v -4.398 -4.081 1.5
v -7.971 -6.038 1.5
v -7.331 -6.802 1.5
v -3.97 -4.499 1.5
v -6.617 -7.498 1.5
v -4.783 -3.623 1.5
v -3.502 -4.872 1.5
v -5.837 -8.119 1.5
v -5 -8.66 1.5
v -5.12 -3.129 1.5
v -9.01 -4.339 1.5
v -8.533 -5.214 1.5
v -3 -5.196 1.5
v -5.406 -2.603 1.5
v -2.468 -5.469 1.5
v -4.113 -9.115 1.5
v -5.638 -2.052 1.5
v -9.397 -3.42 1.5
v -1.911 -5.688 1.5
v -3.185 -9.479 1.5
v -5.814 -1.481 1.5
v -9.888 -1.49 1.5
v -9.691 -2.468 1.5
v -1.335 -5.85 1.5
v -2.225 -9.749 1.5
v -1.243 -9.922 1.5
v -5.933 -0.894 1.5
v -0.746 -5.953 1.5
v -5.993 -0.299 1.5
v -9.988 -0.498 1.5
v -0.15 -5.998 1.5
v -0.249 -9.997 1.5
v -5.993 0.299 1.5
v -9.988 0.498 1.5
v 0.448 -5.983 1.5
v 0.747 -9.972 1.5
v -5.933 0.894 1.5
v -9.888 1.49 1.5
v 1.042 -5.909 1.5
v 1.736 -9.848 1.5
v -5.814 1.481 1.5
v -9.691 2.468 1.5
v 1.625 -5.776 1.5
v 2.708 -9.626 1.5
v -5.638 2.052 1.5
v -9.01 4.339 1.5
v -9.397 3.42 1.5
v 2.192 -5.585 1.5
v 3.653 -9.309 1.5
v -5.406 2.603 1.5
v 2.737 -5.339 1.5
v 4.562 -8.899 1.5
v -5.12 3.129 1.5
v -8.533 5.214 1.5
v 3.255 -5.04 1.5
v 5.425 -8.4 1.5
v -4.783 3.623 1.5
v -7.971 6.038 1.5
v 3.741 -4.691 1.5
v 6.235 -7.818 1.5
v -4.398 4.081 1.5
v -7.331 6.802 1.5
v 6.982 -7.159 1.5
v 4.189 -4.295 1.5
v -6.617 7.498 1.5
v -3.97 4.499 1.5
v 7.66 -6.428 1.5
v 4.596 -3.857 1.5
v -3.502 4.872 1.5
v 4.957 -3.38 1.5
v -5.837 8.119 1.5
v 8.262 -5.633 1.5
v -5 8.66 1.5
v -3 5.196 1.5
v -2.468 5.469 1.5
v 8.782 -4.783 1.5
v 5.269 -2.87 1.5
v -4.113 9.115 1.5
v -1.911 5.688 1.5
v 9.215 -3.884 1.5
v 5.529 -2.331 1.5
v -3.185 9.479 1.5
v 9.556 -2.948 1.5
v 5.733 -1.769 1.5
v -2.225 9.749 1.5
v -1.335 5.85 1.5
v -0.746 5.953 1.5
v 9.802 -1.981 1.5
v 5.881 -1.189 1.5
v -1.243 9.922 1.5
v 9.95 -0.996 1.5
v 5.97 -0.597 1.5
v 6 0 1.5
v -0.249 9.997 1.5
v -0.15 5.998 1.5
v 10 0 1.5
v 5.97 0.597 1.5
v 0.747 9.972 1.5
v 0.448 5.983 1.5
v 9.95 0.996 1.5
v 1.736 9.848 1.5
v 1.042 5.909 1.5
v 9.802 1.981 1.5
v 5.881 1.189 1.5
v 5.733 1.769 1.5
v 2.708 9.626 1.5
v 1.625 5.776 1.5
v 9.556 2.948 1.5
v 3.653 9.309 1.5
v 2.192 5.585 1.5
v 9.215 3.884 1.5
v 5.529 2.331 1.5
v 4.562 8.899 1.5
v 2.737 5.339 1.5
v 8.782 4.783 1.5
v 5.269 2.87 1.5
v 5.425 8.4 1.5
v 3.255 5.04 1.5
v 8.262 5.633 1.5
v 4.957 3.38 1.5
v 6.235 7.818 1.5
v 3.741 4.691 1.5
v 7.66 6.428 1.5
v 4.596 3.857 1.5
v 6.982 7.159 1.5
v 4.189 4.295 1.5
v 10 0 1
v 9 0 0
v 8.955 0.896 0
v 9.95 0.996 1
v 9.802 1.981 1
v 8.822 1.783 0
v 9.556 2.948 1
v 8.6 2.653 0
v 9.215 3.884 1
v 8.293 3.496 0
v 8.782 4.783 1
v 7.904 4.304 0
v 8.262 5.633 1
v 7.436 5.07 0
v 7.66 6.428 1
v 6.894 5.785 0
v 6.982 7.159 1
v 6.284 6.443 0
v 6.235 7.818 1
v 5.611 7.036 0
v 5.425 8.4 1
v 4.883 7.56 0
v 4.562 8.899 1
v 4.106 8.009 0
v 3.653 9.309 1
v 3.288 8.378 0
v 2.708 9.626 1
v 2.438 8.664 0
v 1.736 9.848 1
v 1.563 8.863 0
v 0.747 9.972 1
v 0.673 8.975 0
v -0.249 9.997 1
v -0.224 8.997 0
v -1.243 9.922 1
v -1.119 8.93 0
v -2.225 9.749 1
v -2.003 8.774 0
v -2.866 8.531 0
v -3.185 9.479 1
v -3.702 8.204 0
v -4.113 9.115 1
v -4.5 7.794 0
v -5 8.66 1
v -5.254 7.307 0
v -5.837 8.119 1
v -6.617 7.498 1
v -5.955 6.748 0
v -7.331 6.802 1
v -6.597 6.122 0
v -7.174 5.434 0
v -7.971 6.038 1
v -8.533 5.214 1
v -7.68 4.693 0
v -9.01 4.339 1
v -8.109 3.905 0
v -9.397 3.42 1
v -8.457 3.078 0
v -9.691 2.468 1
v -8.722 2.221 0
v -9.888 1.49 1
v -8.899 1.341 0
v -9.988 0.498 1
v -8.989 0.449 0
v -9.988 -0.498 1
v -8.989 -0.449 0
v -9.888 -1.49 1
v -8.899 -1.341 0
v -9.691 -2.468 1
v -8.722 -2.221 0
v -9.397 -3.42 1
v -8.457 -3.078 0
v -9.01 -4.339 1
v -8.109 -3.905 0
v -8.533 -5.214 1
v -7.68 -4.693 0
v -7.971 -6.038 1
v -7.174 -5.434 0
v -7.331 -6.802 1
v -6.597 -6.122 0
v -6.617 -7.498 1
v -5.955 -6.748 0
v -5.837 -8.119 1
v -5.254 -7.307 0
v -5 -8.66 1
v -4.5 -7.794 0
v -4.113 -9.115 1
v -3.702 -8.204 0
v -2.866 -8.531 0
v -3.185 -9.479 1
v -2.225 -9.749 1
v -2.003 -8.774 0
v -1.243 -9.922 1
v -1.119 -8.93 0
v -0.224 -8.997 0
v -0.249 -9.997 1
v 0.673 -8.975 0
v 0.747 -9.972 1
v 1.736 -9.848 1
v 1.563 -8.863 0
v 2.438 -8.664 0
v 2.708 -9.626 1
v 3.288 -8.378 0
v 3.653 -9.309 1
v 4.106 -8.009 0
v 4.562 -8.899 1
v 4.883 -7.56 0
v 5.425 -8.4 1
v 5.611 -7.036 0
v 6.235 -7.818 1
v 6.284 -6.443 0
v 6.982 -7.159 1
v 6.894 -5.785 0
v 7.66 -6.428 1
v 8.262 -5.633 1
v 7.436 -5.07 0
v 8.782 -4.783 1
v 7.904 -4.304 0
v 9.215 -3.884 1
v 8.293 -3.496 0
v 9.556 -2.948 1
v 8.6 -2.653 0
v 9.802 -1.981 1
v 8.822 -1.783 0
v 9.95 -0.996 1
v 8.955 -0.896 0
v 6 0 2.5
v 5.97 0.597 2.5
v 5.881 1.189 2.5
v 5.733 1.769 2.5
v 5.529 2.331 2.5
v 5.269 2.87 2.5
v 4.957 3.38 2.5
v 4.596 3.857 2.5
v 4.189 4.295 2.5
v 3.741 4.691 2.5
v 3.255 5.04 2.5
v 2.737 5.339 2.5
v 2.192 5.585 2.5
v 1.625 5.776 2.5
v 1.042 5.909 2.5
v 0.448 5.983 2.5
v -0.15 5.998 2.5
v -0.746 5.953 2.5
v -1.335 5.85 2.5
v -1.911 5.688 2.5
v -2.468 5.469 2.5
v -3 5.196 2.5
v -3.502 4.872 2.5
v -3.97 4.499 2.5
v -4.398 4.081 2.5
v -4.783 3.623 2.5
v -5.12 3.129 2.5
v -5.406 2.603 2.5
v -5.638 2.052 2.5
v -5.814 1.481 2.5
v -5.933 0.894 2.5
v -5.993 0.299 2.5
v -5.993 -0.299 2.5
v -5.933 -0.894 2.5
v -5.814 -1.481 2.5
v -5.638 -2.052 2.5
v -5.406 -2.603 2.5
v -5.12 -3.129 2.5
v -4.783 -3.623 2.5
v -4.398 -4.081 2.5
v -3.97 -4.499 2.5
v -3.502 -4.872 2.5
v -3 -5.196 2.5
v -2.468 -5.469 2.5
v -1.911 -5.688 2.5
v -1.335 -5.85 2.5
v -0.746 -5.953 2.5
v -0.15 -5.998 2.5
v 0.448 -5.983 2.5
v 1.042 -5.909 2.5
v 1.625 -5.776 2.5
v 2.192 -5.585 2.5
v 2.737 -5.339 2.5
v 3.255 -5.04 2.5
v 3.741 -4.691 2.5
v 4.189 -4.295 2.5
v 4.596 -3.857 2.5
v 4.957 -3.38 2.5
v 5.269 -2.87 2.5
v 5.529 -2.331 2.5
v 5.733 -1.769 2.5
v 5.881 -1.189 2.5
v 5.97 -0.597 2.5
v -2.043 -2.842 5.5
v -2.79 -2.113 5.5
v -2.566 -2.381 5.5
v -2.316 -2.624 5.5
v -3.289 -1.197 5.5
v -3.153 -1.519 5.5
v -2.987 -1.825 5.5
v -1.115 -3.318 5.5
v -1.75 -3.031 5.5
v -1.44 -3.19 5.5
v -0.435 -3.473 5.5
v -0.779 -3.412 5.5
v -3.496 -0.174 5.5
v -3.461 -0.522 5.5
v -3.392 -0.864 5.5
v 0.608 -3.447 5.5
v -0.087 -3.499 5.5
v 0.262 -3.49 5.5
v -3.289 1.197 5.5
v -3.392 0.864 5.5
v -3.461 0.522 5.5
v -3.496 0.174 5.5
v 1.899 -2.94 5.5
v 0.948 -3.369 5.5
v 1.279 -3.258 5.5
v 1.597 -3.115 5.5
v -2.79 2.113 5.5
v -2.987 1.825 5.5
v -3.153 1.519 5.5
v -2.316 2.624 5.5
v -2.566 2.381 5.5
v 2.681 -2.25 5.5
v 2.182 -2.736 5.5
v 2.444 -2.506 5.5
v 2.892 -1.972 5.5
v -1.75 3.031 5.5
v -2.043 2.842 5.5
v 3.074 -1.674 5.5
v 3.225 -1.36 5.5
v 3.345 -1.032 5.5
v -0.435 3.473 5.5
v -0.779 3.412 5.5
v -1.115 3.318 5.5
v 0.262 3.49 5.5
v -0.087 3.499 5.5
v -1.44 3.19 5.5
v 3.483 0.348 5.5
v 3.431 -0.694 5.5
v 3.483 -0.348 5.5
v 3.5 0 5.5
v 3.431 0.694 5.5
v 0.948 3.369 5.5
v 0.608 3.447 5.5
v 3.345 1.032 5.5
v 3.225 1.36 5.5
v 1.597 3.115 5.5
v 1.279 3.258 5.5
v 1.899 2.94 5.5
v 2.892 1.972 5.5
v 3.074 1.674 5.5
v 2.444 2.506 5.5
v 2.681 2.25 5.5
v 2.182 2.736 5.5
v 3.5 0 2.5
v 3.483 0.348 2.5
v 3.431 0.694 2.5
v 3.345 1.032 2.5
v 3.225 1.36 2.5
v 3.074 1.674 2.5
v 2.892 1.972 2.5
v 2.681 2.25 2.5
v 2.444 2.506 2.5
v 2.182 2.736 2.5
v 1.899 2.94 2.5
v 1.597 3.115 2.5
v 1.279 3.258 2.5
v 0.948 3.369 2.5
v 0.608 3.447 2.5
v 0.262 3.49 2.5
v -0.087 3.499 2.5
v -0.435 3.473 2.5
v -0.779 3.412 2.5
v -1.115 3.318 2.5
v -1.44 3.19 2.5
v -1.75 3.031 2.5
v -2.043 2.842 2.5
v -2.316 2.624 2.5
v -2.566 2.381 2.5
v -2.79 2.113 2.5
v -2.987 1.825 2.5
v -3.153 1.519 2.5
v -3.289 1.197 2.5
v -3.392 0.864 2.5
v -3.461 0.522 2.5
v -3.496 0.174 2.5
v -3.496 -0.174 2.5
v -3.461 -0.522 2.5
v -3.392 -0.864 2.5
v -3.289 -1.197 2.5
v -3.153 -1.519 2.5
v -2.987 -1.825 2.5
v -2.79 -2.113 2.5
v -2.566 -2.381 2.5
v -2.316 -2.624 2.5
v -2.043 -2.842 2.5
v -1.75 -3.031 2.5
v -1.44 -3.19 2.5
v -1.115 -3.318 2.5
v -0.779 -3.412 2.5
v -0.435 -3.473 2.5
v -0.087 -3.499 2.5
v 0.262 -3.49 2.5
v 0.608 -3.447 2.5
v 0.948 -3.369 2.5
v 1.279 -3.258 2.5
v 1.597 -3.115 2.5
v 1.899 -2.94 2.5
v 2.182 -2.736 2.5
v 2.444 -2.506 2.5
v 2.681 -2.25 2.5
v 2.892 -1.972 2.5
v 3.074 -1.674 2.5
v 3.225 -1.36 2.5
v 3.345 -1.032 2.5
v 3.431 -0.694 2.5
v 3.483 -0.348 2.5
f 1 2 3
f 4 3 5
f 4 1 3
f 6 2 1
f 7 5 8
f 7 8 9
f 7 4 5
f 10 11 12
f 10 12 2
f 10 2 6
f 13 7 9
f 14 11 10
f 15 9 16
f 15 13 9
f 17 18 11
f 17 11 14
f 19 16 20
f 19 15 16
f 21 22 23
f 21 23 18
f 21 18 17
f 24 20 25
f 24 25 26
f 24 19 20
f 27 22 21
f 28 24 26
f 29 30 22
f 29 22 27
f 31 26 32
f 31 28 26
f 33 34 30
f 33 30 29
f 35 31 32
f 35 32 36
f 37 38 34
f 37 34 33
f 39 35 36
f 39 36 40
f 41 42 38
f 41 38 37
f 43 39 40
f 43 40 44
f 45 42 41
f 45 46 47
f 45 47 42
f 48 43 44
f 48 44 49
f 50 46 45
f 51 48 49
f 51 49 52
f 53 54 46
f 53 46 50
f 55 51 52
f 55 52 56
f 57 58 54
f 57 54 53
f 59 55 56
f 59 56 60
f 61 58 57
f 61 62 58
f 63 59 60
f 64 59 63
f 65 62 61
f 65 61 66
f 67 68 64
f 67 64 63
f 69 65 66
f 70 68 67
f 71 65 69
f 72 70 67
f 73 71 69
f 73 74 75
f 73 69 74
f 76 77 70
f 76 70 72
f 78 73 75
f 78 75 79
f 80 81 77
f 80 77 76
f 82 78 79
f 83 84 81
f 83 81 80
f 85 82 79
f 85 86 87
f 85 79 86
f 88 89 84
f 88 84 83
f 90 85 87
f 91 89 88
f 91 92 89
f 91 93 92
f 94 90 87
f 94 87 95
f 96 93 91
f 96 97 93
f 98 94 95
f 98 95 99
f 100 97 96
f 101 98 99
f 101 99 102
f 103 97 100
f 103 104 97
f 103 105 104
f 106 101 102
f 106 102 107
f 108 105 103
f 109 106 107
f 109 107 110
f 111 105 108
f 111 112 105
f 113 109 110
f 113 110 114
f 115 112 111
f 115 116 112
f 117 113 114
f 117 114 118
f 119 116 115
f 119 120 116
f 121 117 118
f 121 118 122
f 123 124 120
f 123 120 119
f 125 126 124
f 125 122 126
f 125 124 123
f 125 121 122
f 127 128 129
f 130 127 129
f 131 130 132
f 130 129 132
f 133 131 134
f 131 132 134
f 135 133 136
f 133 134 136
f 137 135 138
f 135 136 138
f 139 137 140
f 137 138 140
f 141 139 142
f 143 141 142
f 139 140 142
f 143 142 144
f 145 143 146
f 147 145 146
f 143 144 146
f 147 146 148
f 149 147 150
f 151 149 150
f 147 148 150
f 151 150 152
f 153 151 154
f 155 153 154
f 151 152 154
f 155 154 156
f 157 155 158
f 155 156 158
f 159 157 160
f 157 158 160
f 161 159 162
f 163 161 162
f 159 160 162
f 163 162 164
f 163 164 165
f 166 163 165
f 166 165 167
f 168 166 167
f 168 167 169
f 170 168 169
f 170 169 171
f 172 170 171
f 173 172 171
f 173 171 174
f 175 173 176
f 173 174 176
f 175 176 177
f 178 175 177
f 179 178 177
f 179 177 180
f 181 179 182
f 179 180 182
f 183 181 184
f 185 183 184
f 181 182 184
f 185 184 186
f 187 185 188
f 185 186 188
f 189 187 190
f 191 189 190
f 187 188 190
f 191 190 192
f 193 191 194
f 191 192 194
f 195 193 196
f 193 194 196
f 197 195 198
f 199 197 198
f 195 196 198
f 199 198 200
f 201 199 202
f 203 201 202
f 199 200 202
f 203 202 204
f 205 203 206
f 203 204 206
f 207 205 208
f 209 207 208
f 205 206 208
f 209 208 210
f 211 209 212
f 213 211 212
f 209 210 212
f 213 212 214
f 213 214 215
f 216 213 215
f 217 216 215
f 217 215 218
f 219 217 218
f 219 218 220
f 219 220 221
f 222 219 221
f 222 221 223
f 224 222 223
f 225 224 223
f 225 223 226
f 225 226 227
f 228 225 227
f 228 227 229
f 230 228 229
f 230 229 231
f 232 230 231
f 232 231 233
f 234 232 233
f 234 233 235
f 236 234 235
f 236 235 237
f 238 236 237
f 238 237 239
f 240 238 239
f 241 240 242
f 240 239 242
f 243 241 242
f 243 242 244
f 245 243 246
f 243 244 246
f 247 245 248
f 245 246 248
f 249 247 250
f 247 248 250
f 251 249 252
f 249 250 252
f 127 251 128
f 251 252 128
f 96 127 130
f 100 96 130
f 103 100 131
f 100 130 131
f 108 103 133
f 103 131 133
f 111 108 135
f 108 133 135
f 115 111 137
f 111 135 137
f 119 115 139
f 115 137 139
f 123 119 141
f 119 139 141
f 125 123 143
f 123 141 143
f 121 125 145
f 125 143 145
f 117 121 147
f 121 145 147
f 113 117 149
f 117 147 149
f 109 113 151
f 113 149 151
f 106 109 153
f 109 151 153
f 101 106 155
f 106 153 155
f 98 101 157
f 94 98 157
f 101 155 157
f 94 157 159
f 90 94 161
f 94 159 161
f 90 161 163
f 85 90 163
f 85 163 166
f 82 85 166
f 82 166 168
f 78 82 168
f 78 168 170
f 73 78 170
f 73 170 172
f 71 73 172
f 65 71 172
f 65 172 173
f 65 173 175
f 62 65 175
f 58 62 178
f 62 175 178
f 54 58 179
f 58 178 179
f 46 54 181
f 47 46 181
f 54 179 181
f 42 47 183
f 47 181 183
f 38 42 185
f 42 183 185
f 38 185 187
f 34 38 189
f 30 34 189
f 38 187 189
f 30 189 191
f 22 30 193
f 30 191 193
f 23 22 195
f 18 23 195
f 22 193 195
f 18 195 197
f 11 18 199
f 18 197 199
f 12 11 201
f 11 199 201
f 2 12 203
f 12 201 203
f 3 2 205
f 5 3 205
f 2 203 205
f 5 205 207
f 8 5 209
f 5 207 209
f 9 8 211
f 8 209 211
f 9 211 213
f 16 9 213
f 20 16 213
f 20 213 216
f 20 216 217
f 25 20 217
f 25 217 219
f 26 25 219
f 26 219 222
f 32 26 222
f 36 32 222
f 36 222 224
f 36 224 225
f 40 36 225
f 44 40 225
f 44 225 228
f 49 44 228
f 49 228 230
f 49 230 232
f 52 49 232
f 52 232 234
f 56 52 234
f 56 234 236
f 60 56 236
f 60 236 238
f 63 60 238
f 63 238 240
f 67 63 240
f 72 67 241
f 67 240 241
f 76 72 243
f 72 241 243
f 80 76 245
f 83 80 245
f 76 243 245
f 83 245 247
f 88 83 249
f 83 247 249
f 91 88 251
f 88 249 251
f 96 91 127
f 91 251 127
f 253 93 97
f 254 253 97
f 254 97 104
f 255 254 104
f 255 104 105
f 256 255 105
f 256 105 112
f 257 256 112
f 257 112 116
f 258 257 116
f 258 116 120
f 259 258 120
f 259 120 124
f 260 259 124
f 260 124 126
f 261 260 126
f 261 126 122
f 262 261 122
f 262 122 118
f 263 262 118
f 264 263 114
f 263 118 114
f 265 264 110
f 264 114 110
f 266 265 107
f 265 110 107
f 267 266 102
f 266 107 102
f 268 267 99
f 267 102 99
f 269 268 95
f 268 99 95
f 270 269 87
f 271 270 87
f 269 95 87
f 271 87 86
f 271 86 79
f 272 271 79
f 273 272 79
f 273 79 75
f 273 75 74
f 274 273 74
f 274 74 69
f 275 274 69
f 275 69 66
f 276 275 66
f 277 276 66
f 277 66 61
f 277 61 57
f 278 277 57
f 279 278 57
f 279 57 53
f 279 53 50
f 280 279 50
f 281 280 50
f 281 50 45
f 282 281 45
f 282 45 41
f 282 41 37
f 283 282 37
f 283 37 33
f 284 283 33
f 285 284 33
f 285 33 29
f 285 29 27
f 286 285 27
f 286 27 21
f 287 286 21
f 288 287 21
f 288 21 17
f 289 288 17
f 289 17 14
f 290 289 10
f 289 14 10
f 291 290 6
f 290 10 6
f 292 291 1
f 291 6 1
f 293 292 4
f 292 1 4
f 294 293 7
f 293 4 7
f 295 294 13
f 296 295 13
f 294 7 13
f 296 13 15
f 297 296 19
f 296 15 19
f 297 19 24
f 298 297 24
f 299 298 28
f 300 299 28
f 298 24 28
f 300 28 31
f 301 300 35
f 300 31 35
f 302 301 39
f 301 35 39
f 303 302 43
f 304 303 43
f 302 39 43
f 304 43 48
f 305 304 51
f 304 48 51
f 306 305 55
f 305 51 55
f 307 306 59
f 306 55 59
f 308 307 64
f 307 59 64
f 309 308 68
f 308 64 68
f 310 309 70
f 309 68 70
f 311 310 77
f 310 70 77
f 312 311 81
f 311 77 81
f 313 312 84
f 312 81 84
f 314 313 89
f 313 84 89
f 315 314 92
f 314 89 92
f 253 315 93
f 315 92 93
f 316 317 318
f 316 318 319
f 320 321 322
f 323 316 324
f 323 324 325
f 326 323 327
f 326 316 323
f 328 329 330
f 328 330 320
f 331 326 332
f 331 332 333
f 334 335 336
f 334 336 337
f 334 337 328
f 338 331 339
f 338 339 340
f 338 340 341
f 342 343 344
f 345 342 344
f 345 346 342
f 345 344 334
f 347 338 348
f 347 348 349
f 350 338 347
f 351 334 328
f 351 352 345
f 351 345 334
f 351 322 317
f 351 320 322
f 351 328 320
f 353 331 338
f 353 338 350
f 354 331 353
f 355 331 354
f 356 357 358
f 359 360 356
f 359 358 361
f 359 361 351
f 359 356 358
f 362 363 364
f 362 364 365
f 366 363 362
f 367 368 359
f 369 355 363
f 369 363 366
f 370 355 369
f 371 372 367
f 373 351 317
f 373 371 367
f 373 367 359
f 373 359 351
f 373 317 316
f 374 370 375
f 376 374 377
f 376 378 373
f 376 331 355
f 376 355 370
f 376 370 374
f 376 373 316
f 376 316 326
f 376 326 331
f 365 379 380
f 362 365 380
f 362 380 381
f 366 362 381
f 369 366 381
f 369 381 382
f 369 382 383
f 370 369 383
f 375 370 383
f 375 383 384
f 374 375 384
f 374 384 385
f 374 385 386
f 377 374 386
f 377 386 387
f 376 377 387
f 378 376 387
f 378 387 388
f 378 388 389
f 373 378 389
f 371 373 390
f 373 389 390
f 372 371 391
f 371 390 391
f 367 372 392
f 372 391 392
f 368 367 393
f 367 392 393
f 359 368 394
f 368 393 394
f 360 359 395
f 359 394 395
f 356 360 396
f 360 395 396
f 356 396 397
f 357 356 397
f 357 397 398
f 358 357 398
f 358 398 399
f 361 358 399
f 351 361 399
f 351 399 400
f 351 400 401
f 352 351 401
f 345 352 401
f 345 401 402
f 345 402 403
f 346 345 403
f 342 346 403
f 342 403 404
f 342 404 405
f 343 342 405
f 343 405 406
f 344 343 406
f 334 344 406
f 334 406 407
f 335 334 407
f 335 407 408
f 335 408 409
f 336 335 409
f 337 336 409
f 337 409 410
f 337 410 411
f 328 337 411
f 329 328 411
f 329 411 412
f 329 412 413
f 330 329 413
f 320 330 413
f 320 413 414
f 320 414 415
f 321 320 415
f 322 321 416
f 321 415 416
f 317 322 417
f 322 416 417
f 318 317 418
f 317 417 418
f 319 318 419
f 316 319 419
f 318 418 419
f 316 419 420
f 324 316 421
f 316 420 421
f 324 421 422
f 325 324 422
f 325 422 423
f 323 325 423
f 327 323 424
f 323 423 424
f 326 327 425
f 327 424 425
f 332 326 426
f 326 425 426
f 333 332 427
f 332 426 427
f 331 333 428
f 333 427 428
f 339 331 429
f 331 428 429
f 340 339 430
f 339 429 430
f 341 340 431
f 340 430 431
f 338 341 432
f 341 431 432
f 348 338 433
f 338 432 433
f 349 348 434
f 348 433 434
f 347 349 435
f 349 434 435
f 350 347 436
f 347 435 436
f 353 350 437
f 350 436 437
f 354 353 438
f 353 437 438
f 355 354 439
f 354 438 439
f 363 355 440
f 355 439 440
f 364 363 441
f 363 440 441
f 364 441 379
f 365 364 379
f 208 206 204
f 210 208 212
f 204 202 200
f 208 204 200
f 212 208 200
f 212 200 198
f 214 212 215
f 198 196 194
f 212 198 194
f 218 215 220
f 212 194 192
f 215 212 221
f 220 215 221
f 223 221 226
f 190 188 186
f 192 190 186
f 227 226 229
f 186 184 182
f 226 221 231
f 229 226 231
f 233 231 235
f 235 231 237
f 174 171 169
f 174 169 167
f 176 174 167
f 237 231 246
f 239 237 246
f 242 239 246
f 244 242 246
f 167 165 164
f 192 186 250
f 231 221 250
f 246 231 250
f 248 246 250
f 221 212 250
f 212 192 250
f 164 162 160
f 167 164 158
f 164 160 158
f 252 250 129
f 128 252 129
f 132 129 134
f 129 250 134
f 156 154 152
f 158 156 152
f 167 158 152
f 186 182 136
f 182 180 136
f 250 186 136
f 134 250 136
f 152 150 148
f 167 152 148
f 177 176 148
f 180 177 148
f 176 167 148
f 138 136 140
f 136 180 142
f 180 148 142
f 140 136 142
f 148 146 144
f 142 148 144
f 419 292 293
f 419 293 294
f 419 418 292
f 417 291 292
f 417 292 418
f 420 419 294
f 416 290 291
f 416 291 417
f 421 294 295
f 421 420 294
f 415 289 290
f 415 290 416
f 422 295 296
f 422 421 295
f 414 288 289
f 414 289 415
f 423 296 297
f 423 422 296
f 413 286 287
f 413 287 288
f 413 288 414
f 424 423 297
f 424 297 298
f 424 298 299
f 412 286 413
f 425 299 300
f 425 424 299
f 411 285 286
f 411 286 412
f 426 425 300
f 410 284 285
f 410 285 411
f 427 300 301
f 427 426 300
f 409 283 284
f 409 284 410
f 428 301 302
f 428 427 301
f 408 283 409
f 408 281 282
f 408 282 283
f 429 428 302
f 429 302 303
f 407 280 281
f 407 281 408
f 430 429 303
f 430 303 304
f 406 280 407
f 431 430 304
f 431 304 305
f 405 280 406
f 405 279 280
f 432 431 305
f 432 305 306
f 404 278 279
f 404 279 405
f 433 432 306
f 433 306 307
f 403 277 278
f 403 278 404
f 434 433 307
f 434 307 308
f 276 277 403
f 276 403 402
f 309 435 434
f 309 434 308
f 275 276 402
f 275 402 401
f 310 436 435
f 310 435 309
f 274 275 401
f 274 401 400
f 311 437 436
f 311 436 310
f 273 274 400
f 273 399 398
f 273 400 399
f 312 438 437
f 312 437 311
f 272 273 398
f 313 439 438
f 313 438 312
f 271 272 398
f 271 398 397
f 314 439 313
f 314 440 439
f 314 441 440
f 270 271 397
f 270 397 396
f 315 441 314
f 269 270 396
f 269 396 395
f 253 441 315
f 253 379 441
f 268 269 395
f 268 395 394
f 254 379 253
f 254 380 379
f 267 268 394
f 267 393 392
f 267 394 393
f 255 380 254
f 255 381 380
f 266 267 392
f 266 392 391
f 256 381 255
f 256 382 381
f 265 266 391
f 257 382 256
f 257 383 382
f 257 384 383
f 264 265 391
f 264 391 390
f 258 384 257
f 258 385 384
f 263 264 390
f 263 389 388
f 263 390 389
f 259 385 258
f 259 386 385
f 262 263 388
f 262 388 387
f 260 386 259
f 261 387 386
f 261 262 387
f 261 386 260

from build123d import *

# Parameters (mm, degrees)
F0_R     = 10
F0_R_2   = 6
F1_DEPTH = 1.5
F0_R_3   = 3.5
F2_DEPTH = 2.5
F3_DEPTH = 5.5
F4_SIZE  = 1


with BuildPart() as f1:
    # F0 (on Top) → F1 (new body)
    with BuildSketch(Plane.XY):
        Circle(F0_R)
        Circle(F0_R_2, mode=Mode.SUBTRACT)
    extrude(amount=F1_DEPTH)

    # F0 (on Top) → F2 (join)
    with BuildSketch(Plane.XY):
        Circle(F0_R_2)
        Circle(F0_R_3, mode=Mode.SUBTRACT)
    extrude(amount=F2_DEPTH)

    # F0 (on Top) → F3 (join)
    with BuildSketch(Plane.XY):
        Circle(F0_R_3)
    extrude(amount=F3_DEPTH)

    # F4
    f4_edges = [f1.edges().sort_by_distance(p)[0] for p in [
        (-10, 0, 0),
    ]]
    chamfer(f4_edges, length=F4_SIZE)


solid = f1.part
